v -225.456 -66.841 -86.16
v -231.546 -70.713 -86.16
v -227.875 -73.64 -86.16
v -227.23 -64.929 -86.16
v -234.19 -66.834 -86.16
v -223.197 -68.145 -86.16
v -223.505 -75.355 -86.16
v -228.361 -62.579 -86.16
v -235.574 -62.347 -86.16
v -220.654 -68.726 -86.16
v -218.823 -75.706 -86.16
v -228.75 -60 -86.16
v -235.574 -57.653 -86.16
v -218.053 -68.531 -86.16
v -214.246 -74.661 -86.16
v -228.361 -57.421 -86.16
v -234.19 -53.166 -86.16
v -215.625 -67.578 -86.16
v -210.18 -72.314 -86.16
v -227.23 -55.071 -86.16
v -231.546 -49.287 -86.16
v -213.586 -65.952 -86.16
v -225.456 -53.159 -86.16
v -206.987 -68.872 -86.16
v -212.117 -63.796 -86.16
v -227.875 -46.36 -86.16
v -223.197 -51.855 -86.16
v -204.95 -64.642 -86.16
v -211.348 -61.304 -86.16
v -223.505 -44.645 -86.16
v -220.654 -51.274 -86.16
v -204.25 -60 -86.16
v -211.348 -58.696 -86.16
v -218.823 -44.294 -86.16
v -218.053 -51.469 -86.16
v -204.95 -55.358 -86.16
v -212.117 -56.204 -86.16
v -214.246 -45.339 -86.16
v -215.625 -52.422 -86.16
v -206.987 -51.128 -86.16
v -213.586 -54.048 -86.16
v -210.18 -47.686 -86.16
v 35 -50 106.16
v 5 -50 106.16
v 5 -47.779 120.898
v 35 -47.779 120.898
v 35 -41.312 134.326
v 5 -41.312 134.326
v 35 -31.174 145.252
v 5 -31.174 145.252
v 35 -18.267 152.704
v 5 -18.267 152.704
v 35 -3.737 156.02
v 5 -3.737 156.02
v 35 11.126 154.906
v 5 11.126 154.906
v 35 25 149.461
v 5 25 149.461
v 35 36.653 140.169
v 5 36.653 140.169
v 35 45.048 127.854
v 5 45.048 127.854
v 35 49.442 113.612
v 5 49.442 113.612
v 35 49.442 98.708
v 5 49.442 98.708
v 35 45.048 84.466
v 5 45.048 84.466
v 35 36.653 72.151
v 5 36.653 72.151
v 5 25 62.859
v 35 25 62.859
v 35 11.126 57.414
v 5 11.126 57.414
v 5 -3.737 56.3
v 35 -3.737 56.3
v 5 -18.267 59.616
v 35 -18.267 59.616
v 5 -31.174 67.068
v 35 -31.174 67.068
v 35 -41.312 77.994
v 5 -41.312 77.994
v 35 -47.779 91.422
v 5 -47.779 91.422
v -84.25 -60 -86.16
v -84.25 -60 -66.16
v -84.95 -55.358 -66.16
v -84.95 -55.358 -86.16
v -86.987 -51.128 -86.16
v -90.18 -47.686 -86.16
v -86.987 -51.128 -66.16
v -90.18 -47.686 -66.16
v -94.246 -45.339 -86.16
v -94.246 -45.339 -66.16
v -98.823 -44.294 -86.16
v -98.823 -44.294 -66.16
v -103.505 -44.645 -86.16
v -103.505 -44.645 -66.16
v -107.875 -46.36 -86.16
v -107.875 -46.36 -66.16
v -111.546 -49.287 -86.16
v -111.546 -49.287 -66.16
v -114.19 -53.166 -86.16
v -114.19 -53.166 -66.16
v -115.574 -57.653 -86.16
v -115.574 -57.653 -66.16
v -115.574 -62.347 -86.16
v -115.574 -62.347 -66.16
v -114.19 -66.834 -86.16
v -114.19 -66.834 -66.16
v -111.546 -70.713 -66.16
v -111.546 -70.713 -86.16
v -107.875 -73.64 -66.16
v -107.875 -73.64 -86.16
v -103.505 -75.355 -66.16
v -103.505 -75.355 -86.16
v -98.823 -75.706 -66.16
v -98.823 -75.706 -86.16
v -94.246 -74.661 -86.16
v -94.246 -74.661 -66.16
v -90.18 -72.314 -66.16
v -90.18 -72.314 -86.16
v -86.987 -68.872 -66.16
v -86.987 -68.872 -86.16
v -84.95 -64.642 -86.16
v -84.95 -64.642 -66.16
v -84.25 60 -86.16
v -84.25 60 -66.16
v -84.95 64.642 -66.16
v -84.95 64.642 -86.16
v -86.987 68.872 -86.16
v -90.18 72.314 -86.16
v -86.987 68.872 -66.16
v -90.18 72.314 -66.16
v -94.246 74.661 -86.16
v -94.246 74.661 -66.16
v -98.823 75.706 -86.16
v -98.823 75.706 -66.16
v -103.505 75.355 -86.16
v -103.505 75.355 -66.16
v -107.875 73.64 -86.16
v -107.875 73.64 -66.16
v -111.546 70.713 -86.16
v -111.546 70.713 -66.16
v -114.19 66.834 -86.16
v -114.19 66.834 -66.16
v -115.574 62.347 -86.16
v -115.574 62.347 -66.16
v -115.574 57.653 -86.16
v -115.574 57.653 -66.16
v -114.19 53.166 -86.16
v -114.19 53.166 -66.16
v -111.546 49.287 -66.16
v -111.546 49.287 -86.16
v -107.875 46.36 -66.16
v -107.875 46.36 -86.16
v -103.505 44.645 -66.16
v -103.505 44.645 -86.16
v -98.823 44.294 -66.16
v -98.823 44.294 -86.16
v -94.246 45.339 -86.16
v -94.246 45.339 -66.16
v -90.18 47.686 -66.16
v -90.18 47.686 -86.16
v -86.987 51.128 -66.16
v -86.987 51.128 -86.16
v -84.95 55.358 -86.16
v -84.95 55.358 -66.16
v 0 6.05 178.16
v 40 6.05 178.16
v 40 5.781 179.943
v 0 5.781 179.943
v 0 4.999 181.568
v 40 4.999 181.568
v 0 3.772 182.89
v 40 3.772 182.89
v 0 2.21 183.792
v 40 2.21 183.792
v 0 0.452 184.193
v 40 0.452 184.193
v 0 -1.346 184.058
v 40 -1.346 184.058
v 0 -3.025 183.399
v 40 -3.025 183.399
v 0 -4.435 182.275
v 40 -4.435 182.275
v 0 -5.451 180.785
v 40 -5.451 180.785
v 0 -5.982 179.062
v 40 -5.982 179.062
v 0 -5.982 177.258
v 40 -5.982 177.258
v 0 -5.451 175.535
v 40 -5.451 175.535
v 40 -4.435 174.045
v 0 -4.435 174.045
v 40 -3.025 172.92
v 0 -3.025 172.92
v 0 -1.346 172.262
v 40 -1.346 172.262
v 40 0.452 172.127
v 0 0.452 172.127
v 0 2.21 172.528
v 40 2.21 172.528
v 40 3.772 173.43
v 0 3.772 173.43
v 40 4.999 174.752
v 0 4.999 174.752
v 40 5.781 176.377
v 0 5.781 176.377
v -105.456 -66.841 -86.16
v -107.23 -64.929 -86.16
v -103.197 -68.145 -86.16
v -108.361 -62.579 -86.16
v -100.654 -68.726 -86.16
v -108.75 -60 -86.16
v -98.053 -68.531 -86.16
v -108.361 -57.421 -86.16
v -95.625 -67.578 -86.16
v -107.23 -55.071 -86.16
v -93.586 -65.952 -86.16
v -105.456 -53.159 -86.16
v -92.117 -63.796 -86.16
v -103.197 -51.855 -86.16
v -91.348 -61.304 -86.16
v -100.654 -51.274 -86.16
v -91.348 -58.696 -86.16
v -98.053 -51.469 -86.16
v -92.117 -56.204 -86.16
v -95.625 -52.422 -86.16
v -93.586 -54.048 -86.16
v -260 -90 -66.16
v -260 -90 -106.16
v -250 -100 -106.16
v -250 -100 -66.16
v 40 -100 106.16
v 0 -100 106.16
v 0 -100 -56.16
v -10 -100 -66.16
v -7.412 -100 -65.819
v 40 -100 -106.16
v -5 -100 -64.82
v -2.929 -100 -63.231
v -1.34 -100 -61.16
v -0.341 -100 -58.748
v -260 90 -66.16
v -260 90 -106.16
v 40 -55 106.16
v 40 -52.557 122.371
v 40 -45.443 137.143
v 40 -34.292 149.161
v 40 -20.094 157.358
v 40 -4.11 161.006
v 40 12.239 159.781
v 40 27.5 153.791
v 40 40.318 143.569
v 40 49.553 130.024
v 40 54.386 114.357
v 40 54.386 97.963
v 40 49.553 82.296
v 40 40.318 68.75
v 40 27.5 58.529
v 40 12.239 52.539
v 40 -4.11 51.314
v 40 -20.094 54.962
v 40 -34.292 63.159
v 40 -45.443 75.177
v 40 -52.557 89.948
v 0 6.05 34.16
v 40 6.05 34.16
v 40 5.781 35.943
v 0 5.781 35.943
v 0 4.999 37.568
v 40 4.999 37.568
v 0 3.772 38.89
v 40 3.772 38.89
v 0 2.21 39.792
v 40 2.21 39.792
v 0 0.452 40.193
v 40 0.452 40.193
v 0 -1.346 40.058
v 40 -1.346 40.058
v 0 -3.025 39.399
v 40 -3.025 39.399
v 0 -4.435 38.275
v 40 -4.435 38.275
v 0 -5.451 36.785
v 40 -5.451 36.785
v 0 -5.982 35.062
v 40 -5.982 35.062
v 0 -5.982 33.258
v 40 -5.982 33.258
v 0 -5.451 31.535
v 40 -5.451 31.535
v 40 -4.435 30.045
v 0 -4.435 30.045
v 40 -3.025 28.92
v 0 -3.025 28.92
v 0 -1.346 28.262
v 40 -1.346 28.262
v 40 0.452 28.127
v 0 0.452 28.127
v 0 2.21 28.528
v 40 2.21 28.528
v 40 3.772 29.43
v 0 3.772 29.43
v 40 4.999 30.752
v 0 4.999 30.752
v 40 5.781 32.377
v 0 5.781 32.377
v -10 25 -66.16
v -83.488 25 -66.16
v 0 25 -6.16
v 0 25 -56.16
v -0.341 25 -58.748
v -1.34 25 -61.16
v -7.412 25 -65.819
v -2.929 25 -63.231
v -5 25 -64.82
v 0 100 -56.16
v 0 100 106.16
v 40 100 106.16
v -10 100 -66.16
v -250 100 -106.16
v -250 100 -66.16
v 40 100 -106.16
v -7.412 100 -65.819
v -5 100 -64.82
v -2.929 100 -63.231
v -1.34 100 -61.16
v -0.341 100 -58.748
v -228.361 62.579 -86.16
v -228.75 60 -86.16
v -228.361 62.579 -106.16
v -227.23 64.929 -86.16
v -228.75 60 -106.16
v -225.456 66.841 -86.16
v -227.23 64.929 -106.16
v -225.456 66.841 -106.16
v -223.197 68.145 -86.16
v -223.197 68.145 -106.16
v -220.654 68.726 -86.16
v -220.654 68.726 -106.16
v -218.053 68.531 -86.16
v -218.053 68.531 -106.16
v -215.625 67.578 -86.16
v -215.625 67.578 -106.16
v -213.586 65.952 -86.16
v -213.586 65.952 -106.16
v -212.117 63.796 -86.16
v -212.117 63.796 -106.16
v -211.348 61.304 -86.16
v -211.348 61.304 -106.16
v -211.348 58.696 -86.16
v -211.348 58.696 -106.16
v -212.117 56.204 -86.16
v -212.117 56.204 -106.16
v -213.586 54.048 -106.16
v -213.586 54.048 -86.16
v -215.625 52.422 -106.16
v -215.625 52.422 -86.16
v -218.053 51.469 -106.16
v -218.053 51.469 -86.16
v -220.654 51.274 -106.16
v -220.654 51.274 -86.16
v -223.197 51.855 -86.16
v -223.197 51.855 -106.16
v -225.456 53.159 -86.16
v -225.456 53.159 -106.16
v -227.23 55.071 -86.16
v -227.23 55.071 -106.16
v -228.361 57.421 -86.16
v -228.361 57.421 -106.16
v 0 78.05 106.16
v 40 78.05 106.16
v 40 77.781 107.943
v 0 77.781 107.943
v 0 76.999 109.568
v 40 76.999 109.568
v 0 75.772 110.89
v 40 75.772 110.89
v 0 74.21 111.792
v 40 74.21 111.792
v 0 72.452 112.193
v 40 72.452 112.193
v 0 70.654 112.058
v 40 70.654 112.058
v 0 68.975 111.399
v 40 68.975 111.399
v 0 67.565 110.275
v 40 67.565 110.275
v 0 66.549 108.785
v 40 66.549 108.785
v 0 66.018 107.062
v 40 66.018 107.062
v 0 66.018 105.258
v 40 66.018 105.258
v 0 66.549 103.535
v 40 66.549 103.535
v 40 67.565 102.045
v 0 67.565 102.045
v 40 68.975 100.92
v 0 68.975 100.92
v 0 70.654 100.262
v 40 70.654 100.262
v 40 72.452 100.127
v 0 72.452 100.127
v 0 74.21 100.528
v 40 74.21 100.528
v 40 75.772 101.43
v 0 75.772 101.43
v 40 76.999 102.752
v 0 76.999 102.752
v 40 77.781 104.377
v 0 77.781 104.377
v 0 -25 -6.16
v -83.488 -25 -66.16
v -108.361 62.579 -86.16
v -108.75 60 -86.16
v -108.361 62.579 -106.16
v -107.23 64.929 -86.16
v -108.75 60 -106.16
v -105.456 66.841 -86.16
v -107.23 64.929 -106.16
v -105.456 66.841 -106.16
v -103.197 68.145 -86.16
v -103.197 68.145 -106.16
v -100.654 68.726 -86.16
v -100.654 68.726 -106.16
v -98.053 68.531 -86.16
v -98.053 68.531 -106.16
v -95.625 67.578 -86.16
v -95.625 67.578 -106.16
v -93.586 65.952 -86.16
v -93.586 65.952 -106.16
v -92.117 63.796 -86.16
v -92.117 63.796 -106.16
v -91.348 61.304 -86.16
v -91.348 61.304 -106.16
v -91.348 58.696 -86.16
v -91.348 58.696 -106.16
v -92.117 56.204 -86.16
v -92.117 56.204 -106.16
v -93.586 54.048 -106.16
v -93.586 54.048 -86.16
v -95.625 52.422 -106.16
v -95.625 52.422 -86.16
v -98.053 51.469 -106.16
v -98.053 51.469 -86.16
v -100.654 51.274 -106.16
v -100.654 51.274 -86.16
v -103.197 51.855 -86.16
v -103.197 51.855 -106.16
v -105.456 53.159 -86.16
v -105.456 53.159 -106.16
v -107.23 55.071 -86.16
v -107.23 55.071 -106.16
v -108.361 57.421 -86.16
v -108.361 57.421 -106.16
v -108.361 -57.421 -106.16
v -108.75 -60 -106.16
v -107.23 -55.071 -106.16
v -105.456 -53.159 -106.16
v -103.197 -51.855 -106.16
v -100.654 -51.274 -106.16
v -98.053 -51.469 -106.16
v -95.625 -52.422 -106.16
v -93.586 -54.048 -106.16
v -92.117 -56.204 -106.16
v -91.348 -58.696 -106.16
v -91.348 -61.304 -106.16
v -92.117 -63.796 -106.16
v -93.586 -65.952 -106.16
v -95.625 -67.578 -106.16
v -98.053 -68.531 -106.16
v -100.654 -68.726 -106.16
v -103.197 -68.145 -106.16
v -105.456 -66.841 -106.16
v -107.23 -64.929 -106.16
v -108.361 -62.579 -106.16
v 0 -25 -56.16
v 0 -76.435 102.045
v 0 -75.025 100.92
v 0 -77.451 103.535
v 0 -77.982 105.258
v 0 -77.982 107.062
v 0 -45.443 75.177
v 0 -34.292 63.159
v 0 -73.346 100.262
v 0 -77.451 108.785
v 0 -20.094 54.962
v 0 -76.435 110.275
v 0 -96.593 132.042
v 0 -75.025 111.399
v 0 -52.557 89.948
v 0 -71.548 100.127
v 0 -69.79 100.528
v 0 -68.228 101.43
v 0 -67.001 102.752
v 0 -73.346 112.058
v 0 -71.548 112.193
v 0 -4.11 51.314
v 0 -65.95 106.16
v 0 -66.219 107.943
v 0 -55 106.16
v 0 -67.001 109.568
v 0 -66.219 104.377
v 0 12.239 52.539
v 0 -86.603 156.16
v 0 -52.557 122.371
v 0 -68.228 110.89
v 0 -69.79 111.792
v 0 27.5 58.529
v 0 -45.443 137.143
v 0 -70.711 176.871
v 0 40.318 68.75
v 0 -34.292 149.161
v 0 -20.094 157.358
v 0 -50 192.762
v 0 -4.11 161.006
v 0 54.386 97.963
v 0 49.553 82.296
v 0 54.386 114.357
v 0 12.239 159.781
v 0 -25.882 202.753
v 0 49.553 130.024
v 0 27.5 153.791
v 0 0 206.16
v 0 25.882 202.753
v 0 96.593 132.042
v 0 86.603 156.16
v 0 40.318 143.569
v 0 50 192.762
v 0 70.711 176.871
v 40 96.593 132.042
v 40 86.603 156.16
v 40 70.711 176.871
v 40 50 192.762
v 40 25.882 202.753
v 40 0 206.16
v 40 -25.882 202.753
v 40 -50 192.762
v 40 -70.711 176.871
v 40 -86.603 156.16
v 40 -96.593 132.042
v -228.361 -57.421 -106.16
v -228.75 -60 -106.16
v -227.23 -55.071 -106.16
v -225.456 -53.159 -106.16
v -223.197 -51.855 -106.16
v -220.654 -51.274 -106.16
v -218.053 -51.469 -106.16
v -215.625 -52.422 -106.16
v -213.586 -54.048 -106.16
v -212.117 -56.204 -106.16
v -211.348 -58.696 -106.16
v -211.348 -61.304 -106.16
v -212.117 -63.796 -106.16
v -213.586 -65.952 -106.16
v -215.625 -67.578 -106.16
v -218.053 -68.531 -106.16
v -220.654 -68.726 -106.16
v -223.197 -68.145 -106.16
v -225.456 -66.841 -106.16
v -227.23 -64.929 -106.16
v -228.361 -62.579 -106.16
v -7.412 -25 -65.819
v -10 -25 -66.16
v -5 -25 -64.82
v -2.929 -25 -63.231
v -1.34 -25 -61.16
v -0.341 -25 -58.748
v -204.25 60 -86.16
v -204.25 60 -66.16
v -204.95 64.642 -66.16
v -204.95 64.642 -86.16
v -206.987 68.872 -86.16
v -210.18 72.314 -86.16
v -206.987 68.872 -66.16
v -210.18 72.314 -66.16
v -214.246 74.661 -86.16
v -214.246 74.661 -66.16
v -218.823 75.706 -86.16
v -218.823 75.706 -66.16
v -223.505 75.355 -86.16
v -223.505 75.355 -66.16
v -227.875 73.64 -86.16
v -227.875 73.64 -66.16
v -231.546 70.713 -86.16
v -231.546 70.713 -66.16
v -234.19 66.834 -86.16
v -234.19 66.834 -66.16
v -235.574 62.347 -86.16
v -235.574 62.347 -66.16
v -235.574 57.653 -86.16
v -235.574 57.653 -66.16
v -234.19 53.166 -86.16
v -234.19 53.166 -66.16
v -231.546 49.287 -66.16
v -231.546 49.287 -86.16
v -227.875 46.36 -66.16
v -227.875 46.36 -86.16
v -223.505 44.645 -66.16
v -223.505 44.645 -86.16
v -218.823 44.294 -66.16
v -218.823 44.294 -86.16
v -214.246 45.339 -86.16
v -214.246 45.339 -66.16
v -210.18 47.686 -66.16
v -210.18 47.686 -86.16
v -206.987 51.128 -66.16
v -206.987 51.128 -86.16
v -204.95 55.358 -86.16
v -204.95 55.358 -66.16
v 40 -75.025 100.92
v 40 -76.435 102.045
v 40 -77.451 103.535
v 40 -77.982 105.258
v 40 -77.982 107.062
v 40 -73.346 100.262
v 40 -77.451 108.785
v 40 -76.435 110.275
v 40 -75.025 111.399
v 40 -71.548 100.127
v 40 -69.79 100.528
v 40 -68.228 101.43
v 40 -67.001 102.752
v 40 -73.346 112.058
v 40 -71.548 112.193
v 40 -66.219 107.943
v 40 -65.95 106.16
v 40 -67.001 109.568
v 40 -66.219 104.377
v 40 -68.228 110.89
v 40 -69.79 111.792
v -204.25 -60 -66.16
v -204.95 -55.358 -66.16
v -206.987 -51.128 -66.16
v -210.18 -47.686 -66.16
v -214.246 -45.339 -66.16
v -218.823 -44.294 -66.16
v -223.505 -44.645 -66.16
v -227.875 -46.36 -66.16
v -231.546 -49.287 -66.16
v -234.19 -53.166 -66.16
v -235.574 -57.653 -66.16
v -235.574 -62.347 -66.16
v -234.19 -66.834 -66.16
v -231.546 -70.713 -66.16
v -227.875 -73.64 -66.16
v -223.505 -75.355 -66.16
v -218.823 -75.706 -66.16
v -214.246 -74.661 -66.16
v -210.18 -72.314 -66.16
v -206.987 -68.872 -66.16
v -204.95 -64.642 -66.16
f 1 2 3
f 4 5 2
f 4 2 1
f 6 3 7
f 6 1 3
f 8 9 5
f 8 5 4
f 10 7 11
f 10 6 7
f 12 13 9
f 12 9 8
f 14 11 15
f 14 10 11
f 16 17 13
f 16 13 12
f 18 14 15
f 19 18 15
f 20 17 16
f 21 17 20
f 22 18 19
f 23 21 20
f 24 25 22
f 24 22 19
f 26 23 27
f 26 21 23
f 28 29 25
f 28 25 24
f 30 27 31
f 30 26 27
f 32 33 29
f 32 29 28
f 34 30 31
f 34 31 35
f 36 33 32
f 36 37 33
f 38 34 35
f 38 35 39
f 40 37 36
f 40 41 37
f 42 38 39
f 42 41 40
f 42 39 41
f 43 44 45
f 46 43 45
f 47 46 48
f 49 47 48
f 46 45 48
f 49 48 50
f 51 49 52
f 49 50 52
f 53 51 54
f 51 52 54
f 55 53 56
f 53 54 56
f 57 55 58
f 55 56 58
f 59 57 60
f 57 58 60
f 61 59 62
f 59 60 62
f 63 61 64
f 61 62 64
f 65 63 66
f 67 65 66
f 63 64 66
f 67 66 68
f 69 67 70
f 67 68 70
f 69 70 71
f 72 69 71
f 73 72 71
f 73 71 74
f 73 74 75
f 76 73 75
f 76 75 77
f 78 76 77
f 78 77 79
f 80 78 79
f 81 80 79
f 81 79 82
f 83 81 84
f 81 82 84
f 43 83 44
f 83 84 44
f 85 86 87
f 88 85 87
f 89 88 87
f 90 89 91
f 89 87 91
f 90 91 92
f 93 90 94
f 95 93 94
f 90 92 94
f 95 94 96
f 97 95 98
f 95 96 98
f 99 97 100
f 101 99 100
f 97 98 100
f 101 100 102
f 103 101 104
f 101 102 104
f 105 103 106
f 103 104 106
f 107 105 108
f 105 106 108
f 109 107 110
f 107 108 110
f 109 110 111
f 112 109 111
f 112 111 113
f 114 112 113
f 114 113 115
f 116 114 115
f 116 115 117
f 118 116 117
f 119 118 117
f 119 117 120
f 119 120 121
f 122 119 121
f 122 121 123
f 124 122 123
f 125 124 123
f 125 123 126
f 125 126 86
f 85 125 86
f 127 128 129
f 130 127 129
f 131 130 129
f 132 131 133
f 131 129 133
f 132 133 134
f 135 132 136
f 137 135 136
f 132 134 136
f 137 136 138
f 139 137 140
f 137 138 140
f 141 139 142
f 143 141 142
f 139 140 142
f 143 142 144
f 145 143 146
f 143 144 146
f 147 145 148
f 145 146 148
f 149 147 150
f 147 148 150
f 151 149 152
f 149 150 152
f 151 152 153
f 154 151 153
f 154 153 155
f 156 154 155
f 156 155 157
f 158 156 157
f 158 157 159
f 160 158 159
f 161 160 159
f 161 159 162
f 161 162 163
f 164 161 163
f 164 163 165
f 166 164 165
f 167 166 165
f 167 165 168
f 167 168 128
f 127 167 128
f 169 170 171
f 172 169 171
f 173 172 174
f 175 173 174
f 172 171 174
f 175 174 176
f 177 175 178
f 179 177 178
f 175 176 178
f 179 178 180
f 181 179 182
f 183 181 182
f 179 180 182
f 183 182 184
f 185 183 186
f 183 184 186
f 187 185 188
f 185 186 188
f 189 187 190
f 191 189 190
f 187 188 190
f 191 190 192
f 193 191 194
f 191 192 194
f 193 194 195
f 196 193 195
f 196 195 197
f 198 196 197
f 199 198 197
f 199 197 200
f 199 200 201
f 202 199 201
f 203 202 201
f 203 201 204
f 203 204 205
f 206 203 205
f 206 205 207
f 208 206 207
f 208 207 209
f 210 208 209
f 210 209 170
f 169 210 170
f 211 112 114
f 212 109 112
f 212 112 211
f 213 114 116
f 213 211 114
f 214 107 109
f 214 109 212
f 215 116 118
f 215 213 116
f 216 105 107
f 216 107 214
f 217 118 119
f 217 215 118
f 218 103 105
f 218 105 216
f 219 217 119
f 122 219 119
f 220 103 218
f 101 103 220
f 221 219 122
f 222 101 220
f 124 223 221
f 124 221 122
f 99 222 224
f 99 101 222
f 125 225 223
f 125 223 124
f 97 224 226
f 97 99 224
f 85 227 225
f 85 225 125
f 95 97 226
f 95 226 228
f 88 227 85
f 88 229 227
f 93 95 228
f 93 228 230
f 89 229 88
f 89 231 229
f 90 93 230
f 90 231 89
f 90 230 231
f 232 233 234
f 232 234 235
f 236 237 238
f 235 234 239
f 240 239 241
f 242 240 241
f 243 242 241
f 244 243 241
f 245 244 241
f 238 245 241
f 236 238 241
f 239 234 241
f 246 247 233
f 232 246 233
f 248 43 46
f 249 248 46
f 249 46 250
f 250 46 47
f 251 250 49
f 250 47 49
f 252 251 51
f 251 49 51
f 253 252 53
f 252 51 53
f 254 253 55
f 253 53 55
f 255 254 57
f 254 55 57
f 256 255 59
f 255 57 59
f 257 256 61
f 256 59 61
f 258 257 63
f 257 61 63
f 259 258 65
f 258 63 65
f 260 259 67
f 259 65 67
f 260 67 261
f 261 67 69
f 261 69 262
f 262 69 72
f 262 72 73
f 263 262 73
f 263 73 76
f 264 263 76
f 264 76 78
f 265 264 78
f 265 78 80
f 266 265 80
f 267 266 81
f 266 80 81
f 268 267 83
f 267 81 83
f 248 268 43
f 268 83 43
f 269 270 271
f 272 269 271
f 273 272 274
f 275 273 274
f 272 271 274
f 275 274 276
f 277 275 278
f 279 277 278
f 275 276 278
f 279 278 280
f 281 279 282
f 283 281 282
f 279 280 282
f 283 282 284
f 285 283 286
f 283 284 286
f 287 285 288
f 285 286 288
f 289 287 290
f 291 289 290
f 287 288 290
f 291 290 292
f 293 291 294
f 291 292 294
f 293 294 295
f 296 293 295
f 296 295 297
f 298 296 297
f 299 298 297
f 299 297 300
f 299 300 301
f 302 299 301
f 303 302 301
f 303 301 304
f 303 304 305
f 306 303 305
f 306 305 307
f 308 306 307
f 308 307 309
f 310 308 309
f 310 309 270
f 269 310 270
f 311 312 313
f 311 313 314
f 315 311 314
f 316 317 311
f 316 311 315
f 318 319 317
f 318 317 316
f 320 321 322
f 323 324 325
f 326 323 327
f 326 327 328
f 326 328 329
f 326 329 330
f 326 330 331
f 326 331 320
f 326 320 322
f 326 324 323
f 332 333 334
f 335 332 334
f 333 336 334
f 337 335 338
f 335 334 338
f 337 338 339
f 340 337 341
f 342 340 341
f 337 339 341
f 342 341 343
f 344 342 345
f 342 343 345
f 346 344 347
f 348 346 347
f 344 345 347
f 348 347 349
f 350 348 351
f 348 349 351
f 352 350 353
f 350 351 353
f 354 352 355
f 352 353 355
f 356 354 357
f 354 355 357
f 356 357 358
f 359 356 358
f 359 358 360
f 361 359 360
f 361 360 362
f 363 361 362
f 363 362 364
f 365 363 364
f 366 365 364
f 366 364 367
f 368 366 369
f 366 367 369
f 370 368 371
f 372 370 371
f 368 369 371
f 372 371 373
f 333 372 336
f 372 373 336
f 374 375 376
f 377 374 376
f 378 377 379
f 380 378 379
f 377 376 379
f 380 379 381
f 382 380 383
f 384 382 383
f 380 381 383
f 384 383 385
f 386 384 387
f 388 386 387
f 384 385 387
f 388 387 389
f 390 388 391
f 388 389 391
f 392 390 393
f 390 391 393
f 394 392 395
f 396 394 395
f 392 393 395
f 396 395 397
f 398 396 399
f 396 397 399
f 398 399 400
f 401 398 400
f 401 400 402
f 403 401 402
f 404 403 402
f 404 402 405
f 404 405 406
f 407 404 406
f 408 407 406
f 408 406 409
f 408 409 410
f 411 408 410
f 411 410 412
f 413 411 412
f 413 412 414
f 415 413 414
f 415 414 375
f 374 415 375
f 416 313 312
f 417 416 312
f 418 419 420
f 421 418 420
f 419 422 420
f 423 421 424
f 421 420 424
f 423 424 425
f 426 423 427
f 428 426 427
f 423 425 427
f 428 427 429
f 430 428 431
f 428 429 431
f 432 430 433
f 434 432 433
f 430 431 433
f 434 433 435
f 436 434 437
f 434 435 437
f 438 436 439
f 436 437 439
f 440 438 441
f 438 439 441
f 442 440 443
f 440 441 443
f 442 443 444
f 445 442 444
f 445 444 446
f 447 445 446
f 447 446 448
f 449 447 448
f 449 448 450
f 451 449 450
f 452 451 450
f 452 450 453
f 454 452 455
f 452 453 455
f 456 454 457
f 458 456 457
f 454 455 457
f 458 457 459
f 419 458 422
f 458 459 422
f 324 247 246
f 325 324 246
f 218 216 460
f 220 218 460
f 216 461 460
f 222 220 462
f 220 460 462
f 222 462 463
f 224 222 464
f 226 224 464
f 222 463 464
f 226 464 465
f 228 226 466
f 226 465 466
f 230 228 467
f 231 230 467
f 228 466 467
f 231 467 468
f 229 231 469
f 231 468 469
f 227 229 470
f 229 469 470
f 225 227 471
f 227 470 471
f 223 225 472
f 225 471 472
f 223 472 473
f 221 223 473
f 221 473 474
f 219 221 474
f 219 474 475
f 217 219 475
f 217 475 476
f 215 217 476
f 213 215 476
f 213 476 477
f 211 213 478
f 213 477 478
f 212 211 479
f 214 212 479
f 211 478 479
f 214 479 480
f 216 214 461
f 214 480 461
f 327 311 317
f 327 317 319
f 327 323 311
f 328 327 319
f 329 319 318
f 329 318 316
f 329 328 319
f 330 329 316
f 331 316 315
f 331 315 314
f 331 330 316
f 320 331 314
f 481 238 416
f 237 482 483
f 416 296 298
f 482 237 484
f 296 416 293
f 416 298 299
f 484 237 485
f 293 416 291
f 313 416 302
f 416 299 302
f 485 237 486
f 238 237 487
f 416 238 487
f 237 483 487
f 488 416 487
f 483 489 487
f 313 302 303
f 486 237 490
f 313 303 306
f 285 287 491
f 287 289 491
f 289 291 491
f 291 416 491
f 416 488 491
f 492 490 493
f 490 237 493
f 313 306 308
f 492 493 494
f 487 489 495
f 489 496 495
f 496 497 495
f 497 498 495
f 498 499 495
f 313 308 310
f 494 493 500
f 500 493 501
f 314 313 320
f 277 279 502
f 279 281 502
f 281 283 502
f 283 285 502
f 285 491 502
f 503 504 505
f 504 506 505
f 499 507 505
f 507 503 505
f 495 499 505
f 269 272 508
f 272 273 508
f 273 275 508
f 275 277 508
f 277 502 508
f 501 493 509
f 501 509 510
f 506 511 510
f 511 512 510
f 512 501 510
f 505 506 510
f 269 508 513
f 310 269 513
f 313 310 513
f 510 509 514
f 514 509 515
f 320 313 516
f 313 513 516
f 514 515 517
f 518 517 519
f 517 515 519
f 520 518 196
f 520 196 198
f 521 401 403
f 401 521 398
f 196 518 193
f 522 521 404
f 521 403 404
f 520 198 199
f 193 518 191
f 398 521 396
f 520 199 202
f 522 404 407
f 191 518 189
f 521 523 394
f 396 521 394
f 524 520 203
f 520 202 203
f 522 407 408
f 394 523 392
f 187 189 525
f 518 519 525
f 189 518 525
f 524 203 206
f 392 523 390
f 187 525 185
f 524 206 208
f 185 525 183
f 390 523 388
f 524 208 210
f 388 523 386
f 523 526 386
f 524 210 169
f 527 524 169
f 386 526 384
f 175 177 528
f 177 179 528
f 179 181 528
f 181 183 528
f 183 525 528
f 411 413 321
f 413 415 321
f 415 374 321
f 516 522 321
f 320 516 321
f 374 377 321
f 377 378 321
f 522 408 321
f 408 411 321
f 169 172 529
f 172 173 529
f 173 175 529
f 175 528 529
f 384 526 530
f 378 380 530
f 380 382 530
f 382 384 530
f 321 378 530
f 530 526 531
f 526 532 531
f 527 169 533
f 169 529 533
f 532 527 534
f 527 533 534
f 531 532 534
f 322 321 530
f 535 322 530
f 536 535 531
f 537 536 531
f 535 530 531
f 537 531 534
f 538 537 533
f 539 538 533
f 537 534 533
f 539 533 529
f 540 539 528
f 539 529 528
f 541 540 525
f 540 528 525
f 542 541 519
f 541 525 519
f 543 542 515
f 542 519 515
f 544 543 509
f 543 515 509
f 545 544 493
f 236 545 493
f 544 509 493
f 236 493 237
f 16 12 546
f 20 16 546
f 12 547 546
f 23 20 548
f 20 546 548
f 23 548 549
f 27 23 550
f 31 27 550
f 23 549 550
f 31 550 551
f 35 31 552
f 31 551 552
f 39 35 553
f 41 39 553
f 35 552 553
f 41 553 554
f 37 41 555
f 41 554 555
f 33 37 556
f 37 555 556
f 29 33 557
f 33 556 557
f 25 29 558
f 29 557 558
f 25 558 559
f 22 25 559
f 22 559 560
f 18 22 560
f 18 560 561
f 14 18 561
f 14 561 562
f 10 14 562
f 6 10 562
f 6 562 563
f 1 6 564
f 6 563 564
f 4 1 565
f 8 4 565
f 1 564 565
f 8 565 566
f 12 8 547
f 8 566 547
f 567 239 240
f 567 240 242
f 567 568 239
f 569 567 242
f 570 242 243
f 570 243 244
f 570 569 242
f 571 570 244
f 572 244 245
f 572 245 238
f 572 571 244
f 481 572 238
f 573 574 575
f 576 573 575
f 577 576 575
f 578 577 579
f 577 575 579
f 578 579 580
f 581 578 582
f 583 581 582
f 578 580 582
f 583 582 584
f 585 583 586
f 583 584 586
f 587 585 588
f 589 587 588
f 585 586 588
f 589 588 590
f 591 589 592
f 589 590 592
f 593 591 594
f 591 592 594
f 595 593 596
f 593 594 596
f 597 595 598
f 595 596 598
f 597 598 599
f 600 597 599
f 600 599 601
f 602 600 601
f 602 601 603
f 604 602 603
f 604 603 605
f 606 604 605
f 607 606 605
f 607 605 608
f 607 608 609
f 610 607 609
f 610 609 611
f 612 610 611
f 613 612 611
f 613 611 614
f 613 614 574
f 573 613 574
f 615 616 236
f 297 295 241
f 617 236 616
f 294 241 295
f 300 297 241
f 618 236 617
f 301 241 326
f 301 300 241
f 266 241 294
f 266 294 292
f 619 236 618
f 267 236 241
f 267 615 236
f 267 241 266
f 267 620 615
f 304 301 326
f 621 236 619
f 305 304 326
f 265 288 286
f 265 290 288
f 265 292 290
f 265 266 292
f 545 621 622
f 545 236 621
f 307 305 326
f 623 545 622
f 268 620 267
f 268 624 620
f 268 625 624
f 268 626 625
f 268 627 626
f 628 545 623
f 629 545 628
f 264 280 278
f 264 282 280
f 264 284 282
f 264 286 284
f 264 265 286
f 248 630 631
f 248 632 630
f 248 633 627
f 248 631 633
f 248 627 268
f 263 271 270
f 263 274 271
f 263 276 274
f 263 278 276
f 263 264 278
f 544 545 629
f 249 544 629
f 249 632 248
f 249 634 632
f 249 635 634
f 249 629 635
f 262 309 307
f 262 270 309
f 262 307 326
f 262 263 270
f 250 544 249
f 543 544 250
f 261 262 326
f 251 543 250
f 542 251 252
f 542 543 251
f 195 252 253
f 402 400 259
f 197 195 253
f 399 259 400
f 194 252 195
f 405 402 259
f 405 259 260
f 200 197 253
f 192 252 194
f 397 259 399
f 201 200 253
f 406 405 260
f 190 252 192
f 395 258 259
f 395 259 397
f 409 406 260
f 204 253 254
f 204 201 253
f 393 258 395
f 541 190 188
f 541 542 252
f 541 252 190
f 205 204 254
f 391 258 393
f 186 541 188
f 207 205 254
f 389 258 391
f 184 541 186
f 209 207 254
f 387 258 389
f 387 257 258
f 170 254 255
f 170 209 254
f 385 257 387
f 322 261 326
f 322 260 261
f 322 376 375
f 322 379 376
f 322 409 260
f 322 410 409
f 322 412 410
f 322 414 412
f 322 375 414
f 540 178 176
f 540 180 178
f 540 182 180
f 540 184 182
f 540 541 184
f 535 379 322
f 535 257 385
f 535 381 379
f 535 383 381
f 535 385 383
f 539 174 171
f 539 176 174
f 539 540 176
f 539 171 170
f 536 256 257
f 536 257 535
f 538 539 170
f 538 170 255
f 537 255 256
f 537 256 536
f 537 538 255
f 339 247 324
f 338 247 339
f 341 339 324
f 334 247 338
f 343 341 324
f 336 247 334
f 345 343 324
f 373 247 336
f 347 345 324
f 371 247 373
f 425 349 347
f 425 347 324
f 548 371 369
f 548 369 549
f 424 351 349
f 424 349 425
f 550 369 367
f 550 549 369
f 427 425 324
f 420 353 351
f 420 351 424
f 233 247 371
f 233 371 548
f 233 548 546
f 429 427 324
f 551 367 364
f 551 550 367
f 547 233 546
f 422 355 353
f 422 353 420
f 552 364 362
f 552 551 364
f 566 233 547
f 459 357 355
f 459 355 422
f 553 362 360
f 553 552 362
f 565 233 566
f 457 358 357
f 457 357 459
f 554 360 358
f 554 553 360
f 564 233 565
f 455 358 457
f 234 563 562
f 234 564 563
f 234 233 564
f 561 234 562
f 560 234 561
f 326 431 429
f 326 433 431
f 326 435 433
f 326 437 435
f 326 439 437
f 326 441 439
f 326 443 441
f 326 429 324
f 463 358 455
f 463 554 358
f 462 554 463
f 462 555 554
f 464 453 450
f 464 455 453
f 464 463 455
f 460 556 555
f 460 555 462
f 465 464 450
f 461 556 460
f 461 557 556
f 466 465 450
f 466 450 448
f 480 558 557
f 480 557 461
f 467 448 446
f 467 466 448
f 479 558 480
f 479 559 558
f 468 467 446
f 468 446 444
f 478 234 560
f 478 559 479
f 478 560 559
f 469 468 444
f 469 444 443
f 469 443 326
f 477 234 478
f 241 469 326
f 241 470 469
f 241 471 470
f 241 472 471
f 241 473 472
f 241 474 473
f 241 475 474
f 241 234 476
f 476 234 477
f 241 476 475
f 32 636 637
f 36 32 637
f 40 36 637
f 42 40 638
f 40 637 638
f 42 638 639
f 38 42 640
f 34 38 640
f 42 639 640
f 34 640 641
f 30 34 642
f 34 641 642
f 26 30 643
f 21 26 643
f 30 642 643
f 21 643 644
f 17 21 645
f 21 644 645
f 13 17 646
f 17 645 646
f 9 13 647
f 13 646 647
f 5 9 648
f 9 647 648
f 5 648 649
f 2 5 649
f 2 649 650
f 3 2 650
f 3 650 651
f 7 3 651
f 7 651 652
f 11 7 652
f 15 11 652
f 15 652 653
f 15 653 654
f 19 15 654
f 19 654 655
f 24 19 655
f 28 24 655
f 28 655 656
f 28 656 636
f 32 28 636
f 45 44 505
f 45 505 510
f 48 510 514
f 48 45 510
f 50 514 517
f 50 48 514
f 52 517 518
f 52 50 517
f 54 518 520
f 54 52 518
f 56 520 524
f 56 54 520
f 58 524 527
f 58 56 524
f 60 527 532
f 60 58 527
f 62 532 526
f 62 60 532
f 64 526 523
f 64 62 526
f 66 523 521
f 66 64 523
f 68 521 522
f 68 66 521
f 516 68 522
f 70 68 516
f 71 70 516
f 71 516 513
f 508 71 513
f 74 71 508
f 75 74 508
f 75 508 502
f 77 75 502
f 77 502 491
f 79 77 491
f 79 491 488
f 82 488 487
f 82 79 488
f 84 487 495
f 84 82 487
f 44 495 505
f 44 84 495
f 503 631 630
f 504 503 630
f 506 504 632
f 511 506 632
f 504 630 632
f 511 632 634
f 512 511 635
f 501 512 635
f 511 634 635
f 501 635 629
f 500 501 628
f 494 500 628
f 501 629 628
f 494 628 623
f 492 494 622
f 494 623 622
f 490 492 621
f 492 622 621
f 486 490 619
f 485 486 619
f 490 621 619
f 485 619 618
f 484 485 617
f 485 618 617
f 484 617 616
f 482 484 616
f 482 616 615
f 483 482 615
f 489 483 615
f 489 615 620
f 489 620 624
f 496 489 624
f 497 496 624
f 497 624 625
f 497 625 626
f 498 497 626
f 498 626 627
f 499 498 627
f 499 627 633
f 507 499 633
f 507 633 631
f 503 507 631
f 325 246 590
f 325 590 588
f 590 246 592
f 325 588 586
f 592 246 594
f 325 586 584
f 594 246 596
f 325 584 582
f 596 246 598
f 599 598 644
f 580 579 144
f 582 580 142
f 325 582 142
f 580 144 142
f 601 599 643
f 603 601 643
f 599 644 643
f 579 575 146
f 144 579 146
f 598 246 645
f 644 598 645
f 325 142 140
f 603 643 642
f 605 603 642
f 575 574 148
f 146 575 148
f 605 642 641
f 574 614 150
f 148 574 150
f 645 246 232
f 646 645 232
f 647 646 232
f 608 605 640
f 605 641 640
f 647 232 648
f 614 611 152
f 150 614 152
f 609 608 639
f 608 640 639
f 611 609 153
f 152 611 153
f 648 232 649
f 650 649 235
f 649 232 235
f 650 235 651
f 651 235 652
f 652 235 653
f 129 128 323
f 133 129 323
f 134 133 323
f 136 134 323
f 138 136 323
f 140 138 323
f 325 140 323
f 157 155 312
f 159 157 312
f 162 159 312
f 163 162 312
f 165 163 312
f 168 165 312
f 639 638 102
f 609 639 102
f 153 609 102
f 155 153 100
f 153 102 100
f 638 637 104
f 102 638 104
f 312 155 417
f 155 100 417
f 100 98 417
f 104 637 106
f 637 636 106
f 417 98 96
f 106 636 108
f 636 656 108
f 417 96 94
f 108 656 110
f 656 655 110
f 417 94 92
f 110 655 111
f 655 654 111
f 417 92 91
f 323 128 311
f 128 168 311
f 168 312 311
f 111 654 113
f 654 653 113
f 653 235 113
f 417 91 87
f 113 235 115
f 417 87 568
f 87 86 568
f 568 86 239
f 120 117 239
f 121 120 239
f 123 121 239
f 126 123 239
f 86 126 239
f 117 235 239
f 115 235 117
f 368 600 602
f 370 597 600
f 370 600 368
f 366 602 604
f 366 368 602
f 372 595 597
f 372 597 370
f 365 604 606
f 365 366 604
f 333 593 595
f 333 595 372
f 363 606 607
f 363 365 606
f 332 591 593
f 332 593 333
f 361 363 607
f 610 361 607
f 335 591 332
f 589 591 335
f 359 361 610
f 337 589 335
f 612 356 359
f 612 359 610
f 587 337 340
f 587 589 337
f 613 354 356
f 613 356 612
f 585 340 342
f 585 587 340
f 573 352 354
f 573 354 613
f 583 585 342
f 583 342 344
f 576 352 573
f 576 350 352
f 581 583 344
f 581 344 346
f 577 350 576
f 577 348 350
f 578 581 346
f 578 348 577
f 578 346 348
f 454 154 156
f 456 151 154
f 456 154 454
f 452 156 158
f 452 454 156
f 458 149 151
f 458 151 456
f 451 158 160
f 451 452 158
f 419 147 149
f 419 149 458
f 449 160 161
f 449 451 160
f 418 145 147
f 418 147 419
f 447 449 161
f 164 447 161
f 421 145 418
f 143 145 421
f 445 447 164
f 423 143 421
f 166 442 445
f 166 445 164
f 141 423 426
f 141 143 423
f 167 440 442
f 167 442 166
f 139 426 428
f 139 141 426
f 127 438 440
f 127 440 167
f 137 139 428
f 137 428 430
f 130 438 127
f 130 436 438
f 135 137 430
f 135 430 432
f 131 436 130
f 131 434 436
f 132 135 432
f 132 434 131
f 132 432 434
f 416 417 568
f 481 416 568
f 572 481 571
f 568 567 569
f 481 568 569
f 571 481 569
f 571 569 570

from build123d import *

# Parameters (mm, degrees)
F1_DEPTH        = 40
F2_W            = 300
F2_H            = 200
F3_DEPTH        = 40
F4_W            = 83.487585187
F4_H            = 50
F5_DEPTH        = 60
F7_DEPTH        = 125.001
F8_R            = 10
F10_D           = 12.1
F11_SIZE        = 5
F13_D           = 17.5
F13_CBORE_D     = 31.5
F13_CBORE_DEPTH = 20
F14_SIZE        = 10


with BuildPart() as f1:
    # F0 (on Right) → F1 (new body)
    with BuildSketch(Plane.YZ):
        with BuildLine():
            Line((-100, 106.1599394854), (-100, -106.1599394854))
            Line((-100, -106.1599394854), (100, -106.1599394854))
            Line((100, -106.1599394854), (100, 106.1599394854))
            Line((100, 106.1599394854), (50, 106.1599394854))
            ThreePointArc((50, 106.1599394854), (0, 56.1599394854), (-50, 106.1599394854))
            Line((-50, 106.1599394854), (-100, 106.1599394854))
        make_face()
        with BuildLine():
            ThreePointArc((100, 106.1599394854), (0, 206.1599394854), (-100, 106.1599394854))
            Line((-100, 106.1599394854), (-50, 106.1599394854))
            ThreePointArc((-50, 106.1599394854), (0, 156.1599394854), (50, 106.1599394854))
            Line((50, 106.1599394854), (100, 106.1599394854))
        make_face()
    extrude(amount=F1_DEPTH)

    # F2 (on face) → F3 (join)
    with BuildSketch(Plane(origin=(0, 0, -106.1599394854), x_dir=(1, 0, 0), z_dir=(0, 0, -1))):
        with Locations((-110, 0)):
            Rectangle(F2_W, F2_H)
    extrude(amount=-F3_DEPTH)

    # F4 (on face) → F5 (join)
    with BuildSketch(Plane.XY.offset(-66.1599394854)):
        with Locations((-41.7437925935, 0)):
            Rectangle(F4_W, F4_H)
    extrude(amount=F5_DEPTH)

    # F6 (on face) → F7 (cut, through all)
    with BuildSketch(Plane(origin=(0, 25, 0), x_dir=(-1, 0, 0), z_dir=(0, 1, 0))):
        Polygon((83.487585187, -6.1599394854), (0, -6.1599394854), (83.487585187, -66.1599394854), align=None)
    extrude(amount=-F7_DEPTH, mode=Mode.SUBTRACT)

    # F8
    f8_edges = [f1.edges().sort_by_distance(p)[0] for p in [
        (0, 62.5, -66.159939),
        (0, -62.5, -66.159939),
    ]]
    fillet(f8_edges, radius=F8_R)

    # F10 (through all)
    with Locations(Plane(origin=(0, 0, 0), x_dir=(0, -1, 0), z_dir=(-1, 0, 0))):
        with Locations((0, 178.1599394854), (-72, 106.1599394854), (0, 34.1599394854), (72, 106.1599394854)):
            Hole(F10_D / 2)

    # F11
    f11_edges = [f1.edges().sort_by_distance(p)[0] for p in [
        (0, 50, 106.159939),
        (40, 50, 106.159939),
    ]]
    chamfer(f11_edges, length=F11_SIZE)

    # F13 (through all)
    with Locations(Plane.XY.offset(-66.1599394854)):
        with Locations((-220, 60), (-220, -60), (-100, 60), (-100, -60)):
            CounterBoreHole(F13_D / 2, F13_CBORE_D / 2, F13_CBORE_DEPTH)

    # F14
    f14_edges = [f1.edges().sort_by_distance(p)[0] for p in [
        (-260, 100, -86.159939),
        (-260, -100, -86.159939),
    ]]
    chamfer(f14_edges, length=F14_SIZE)


solid = f1.part
